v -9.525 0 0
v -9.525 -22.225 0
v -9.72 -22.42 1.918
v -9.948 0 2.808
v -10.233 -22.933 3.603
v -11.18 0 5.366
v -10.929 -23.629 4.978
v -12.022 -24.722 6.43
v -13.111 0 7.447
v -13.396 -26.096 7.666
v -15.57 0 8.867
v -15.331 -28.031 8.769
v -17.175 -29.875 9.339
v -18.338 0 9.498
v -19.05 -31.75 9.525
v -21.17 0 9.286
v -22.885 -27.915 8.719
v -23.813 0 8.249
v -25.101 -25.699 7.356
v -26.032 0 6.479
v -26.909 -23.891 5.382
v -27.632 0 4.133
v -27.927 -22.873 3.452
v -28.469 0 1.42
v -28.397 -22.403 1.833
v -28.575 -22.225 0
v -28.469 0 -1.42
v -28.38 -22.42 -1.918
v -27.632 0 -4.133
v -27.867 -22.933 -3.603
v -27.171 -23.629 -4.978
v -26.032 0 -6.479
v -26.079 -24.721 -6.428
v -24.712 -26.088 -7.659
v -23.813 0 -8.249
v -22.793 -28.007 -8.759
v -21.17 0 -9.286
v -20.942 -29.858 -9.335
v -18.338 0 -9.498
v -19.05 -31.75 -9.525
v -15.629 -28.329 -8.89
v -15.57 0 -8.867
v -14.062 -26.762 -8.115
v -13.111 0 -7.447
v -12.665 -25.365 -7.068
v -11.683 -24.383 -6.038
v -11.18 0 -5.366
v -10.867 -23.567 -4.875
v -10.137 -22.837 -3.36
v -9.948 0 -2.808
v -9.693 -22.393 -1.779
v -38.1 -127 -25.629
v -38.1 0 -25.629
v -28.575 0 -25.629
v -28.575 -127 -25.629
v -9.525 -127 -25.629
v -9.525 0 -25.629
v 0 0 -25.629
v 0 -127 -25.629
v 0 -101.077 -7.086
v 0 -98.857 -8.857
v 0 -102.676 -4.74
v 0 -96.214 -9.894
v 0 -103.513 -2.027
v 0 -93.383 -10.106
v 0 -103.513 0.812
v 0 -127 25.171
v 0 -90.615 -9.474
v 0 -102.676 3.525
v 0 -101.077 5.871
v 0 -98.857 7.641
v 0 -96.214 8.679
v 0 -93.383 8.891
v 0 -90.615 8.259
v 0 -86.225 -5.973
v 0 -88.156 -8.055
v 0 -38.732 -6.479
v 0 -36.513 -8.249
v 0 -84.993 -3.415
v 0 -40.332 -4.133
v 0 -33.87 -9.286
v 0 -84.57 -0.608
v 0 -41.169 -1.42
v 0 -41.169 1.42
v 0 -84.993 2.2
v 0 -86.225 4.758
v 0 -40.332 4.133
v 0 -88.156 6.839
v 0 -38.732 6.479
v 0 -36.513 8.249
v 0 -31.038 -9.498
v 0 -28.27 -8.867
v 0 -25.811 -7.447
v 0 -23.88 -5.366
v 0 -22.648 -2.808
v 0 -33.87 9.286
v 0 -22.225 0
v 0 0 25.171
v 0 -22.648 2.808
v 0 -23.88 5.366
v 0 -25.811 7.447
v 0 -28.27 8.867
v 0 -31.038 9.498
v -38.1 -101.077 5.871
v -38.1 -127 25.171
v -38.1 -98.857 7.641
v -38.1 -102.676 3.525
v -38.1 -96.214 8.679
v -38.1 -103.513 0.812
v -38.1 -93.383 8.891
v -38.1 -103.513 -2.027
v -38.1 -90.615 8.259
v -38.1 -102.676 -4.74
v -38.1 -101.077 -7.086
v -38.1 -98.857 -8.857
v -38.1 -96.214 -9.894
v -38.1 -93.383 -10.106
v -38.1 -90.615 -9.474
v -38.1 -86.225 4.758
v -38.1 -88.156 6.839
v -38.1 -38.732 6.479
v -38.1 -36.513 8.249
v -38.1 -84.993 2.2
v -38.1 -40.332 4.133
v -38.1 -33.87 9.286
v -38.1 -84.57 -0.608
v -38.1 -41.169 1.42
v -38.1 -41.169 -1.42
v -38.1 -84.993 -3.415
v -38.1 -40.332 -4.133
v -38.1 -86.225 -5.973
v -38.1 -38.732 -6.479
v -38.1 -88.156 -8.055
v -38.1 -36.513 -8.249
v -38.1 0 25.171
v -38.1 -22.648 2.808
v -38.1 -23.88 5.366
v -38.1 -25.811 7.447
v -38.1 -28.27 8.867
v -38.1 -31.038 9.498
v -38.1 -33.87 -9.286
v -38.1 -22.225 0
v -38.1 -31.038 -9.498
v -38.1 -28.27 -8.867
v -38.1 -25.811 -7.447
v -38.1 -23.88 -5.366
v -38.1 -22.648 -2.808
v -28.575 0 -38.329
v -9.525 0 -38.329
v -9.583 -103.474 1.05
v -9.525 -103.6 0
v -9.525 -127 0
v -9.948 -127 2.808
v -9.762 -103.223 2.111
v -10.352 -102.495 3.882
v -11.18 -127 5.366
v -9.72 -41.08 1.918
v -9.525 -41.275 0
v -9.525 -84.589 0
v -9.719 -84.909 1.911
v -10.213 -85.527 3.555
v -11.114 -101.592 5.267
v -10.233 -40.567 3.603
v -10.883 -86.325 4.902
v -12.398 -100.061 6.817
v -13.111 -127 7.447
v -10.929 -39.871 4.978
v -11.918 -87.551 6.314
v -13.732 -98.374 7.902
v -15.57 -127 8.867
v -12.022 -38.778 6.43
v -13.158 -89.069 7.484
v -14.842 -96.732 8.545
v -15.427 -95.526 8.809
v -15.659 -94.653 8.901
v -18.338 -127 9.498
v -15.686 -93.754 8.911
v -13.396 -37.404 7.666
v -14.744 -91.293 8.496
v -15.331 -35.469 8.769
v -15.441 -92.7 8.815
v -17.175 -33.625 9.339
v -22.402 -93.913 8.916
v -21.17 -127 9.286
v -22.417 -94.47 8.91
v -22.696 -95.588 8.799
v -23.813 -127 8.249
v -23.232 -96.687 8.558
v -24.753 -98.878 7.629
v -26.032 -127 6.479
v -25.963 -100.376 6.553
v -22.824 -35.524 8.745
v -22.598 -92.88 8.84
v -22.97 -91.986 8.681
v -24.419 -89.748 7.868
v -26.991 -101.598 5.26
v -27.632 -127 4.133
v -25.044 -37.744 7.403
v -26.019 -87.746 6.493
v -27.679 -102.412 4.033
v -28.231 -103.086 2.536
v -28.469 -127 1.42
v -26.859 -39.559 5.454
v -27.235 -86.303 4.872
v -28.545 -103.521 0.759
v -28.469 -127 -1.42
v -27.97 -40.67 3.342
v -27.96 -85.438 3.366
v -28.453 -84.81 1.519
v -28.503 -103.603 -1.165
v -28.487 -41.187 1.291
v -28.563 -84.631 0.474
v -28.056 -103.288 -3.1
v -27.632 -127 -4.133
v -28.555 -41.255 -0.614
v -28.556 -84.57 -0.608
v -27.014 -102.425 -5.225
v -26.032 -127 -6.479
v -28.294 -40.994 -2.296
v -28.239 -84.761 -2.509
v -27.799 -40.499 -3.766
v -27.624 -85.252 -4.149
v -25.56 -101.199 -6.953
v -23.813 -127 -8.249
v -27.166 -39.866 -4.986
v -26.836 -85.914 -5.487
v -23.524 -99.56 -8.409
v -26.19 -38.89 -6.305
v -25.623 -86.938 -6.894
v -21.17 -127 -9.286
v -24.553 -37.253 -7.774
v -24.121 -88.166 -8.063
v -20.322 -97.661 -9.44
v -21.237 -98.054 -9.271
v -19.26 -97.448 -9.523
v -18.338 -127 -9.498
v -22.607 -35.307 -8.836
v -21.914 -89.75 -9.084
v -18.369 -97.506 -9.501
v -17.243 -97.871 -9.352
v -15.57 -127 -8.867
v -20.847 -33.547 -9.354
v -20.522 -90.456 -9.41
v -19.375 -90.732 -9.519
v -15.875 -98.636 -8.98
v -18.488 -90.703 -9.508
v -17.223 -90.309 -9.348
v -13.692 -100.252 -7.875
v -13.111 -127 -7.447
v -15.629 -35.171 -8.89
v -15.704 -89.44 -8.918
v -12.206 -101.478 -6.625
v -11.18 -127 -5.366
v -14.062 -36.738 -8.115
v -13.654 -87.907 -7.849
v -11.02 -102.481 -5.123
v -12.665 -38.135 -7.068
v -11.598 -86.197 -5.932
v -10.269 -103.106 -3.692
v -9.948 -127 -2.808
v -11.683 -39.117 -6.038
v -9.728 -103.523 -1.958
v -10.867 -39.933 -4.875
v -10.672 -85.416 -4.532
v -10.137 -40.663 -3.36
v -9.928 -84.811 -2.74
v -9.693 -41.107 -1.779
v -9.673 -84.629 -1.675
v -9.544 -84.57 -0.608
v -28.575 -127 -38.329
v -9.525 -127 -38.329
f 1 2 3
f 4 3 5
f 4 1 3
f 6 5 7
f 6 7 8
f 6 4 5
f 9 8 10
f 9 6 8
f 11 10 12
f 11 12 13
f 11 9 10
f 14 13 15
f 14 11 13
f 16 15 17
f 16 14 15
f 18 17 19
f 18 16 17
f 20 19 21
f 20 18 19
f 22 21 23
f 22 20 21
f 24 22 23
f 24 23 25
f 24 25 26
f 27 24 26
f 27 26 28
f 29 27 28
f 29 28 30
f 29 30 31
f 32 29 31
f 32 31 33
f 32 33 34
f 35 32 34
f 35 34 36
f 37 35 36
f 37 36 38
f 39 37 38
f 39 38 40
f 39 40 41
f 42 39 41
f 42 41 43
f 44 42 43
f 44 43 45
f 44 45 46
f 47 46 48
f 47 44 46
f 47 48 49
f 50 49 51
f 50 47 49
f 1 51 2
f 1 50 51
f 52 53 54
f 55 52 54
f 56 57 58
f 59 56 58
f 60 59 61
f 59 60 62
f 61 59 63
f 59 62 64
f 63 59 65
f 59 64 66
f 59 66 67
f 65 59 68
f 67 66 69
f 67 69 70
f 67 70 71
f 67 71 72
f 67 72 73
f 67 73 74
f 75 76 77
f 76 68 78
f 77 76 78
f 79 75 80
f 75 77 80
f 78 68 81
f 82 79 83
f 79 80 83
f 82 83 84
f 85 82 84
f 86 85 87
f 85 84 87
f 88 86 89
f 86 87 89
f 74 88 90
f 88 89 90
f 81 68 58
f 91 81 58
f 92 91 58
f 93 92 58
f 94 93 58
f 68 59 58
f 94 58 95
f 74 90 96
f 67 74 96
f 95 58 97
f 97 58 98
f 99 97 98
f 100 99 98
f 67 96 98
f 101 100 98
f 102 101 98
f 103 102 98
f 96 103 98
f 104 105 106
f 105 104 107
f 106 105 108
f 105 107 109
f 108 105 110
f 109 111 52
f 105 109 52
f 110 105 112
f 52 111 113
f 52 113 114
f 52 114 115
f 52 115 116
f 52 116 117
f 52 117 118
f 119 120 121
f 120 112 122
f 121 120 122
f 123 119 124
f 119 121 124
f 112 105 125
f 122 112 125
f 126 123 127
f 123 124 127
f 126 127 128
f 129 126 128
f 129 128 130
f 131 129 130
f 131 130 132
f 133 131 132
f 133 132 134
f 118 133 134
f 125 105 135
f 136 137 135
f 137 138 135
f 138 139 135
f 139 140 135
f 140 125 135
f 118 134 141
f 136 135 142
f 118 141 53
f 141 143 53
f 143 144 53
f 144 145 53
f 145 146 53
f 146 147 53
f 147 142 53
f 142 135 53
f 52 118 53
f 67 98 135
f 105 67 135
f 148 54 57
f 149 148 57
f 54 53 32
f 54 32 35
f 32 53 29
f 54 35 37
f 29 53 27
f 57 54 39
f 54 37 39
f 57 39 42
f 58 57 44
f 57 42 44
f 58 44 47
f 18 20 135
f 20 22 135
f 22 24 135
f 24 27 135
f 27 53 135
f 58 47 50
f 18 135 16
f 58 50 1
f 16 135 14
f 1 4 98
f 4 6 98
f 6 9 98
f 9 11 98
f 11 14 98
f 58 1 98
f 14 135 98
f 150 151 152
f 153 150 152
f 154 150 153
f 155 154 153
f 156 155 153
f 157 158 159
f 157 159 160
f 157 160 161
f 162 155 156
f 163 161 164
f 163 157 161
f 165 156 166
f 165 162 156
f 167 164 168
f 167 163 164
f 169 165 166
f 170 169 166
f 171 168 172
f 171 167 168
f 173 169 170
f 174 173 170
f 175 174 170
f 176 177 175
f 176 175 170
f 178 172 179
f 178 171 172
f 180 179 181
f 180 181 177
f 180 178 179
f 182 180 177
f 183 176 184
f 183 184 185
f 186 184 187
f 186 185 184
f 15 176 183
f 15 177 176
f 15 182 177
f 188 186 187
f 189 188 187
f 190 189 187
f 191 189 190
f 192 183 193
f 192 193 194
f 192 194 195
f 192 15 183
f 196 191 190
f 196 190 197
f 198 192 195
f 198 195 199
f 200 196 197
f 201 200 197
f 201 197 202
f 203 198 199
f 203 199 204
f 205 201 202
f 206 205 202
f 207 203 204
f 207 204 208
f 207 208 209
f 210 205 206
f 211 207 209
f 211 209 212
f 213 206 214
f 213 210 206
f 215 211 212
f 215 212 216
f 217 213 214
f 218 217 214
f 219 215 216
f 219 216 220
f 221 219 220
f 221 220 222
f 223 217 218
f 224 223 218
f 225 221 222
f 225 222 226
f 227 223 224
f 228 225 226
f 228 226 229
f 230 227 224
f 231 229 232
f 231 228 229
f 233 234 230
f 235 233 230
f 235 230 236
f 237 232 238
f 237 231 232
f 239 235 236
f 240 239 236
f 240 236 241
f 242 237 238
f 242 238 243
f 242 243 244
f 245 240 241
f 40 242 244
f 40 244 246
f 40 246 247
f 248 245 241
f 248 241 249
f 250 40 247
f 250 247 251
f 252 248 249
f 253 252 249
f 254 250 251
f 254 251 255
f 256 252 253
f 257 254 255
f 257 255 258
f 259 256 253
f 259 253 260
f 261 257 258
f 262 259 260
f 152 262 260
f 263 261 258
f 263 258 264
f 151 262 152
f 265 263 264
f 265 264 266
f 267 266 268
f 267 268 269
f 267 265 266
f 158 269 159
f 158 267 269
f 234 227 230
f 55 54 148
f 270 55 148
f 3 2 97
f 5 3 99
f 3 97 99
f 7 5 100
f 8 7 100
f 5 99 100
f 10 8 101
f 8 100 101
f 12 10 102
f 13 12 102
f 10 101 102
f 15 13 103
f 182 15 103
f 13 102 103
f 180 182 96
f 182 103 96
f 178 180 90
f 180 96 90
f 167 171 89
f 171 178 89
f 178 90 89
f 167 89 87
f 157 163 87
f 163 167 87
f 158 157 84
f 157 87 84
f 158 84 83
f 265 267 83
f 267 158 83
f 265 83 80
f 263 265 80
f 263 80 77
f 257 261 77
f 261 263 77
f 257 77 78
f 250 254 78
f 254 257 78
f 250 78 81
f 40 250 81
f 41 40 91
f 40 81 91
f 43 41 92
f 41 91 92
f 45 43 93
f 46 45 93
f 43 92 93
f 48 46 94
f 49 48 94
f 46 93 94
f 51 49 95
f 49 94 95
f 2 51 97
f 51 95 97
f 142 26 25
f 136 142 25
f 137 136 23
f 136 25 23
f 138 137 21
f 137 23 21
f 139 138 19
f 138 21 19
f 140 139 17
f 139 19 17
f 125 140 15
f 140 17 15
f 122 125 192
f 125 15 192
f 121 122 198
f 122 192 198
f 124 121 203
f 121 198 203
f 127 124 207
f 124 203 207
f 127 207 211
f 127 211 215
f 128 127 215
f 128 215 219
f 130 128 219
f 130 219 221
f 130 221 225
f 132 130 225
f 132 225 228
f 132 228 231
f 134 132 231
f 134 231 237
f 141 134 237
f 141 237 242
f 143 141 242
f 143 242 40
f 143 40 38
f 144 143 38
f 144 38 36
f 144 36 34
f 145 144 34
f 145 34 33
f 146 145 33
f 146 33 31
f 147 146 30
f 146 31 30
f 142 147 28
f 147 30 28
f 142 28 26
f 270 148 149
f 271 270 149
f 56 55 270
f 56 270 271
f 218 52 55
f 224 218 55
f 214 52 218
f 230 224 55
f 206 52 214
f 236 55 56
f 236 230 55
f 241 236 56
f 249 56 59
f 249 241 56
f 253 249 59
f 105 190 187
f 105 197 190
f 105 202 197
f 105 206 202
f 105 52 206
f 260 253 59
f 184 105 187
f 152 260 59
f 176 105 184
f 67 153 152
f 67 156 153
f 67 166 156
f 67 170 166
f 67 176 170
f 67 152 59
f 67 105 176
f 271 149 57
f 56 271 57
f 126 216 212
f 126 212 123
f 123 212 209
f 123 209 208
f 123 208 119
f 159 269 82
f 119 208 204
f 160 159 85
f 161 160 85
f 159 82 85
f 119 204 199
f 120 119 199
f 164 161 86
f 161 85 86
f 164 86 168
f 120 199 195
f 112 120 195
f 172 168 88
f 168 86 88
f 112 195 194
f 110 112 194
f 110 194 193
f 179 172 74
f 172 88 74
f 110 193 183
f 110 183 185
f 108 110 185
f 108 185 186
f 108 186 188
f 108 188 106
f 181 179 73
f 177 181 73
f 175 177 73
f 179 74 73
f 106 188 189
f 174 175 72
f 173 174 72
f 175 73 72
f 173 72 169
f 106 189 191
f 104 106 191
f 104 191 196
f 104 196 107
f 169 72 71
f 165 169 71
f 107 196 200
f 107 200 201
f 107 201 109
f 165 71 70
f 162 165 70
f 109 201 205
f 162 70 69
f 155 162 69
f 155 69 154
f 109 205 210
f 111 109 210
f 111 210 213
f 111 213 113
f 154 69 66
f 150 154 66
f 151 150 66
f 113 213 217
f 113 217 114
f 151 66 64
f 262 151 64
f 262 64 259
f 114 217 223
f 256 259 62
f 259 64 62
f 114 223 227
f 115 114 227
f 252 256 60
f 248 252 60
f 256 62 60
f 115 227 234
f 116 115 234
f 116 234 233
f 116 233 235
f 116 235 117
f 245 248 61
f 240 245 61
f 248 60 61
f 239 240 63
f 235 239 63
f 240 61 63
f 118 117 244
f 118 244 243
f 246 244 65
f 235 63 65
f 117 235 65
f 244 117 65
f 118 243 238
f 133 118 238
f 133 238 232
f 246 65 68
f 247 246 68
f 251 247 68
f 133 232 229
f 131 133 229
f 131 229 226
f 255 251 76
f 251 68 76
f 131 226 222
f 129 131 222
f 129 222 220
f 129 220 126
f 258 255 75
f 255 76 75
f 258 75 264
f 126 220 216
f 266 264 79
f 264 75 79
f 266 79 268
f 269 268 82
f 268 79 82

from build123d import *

# Parameters (mm, degrees)
F0_R     = 9.525
F1_DEPTH = 127
F2_R     = 9.525
F3_DEPTH = 60.96


with BuildPart() as f1:
    # F0 (on Front) → F1 (new body)
    with BuildSketch(Plane.XZ):
        Polygon((-28.575, -25.6290164173), (-28.575, -38.3290164173), (-9.525, -38.3290164173), (-9.525, -25.6290164173), (0, -25.6290164173), (0, 25.1709835827), (-38.1, 25.1709835827), (-38.1, -25.6290164173), align=None)
        with Locations((-19.05, 0)):
            Circle(F0_R, mode=Mode.SUBTRACT)
    extrude(amount=F1_DEPTH)

    # F2 (on Right) → F3 (cut)
    with BuildSketch(Plane.YZ):
        with BuildLine():
            ThreePointArc((-22.225, 0), (-25.0148079092, 6.7351920908), (-31.75, 9.525))
            Line((-31.75, 9.525), (-31.75, -9.525))
            ThreePointArc((-31.75, -9.525), (-25.0148079092, -6.7351920908), (-22.225, 0))
        make_face()
        with BuildLine():
            Line((-31.75, -9.525), (-31.75, 9.525))
            ThreePointArc((-31.75, 9.525), (-41.275, 0), (-31.75, -9.525))
        make_face()
        with Locations((-94.0945148468, -0.607660502)):
            Circle(F2_R)
    extrude(amount=-F3_DEPTH, mode=Mode.SUBTRACT)


solid = f1.part
